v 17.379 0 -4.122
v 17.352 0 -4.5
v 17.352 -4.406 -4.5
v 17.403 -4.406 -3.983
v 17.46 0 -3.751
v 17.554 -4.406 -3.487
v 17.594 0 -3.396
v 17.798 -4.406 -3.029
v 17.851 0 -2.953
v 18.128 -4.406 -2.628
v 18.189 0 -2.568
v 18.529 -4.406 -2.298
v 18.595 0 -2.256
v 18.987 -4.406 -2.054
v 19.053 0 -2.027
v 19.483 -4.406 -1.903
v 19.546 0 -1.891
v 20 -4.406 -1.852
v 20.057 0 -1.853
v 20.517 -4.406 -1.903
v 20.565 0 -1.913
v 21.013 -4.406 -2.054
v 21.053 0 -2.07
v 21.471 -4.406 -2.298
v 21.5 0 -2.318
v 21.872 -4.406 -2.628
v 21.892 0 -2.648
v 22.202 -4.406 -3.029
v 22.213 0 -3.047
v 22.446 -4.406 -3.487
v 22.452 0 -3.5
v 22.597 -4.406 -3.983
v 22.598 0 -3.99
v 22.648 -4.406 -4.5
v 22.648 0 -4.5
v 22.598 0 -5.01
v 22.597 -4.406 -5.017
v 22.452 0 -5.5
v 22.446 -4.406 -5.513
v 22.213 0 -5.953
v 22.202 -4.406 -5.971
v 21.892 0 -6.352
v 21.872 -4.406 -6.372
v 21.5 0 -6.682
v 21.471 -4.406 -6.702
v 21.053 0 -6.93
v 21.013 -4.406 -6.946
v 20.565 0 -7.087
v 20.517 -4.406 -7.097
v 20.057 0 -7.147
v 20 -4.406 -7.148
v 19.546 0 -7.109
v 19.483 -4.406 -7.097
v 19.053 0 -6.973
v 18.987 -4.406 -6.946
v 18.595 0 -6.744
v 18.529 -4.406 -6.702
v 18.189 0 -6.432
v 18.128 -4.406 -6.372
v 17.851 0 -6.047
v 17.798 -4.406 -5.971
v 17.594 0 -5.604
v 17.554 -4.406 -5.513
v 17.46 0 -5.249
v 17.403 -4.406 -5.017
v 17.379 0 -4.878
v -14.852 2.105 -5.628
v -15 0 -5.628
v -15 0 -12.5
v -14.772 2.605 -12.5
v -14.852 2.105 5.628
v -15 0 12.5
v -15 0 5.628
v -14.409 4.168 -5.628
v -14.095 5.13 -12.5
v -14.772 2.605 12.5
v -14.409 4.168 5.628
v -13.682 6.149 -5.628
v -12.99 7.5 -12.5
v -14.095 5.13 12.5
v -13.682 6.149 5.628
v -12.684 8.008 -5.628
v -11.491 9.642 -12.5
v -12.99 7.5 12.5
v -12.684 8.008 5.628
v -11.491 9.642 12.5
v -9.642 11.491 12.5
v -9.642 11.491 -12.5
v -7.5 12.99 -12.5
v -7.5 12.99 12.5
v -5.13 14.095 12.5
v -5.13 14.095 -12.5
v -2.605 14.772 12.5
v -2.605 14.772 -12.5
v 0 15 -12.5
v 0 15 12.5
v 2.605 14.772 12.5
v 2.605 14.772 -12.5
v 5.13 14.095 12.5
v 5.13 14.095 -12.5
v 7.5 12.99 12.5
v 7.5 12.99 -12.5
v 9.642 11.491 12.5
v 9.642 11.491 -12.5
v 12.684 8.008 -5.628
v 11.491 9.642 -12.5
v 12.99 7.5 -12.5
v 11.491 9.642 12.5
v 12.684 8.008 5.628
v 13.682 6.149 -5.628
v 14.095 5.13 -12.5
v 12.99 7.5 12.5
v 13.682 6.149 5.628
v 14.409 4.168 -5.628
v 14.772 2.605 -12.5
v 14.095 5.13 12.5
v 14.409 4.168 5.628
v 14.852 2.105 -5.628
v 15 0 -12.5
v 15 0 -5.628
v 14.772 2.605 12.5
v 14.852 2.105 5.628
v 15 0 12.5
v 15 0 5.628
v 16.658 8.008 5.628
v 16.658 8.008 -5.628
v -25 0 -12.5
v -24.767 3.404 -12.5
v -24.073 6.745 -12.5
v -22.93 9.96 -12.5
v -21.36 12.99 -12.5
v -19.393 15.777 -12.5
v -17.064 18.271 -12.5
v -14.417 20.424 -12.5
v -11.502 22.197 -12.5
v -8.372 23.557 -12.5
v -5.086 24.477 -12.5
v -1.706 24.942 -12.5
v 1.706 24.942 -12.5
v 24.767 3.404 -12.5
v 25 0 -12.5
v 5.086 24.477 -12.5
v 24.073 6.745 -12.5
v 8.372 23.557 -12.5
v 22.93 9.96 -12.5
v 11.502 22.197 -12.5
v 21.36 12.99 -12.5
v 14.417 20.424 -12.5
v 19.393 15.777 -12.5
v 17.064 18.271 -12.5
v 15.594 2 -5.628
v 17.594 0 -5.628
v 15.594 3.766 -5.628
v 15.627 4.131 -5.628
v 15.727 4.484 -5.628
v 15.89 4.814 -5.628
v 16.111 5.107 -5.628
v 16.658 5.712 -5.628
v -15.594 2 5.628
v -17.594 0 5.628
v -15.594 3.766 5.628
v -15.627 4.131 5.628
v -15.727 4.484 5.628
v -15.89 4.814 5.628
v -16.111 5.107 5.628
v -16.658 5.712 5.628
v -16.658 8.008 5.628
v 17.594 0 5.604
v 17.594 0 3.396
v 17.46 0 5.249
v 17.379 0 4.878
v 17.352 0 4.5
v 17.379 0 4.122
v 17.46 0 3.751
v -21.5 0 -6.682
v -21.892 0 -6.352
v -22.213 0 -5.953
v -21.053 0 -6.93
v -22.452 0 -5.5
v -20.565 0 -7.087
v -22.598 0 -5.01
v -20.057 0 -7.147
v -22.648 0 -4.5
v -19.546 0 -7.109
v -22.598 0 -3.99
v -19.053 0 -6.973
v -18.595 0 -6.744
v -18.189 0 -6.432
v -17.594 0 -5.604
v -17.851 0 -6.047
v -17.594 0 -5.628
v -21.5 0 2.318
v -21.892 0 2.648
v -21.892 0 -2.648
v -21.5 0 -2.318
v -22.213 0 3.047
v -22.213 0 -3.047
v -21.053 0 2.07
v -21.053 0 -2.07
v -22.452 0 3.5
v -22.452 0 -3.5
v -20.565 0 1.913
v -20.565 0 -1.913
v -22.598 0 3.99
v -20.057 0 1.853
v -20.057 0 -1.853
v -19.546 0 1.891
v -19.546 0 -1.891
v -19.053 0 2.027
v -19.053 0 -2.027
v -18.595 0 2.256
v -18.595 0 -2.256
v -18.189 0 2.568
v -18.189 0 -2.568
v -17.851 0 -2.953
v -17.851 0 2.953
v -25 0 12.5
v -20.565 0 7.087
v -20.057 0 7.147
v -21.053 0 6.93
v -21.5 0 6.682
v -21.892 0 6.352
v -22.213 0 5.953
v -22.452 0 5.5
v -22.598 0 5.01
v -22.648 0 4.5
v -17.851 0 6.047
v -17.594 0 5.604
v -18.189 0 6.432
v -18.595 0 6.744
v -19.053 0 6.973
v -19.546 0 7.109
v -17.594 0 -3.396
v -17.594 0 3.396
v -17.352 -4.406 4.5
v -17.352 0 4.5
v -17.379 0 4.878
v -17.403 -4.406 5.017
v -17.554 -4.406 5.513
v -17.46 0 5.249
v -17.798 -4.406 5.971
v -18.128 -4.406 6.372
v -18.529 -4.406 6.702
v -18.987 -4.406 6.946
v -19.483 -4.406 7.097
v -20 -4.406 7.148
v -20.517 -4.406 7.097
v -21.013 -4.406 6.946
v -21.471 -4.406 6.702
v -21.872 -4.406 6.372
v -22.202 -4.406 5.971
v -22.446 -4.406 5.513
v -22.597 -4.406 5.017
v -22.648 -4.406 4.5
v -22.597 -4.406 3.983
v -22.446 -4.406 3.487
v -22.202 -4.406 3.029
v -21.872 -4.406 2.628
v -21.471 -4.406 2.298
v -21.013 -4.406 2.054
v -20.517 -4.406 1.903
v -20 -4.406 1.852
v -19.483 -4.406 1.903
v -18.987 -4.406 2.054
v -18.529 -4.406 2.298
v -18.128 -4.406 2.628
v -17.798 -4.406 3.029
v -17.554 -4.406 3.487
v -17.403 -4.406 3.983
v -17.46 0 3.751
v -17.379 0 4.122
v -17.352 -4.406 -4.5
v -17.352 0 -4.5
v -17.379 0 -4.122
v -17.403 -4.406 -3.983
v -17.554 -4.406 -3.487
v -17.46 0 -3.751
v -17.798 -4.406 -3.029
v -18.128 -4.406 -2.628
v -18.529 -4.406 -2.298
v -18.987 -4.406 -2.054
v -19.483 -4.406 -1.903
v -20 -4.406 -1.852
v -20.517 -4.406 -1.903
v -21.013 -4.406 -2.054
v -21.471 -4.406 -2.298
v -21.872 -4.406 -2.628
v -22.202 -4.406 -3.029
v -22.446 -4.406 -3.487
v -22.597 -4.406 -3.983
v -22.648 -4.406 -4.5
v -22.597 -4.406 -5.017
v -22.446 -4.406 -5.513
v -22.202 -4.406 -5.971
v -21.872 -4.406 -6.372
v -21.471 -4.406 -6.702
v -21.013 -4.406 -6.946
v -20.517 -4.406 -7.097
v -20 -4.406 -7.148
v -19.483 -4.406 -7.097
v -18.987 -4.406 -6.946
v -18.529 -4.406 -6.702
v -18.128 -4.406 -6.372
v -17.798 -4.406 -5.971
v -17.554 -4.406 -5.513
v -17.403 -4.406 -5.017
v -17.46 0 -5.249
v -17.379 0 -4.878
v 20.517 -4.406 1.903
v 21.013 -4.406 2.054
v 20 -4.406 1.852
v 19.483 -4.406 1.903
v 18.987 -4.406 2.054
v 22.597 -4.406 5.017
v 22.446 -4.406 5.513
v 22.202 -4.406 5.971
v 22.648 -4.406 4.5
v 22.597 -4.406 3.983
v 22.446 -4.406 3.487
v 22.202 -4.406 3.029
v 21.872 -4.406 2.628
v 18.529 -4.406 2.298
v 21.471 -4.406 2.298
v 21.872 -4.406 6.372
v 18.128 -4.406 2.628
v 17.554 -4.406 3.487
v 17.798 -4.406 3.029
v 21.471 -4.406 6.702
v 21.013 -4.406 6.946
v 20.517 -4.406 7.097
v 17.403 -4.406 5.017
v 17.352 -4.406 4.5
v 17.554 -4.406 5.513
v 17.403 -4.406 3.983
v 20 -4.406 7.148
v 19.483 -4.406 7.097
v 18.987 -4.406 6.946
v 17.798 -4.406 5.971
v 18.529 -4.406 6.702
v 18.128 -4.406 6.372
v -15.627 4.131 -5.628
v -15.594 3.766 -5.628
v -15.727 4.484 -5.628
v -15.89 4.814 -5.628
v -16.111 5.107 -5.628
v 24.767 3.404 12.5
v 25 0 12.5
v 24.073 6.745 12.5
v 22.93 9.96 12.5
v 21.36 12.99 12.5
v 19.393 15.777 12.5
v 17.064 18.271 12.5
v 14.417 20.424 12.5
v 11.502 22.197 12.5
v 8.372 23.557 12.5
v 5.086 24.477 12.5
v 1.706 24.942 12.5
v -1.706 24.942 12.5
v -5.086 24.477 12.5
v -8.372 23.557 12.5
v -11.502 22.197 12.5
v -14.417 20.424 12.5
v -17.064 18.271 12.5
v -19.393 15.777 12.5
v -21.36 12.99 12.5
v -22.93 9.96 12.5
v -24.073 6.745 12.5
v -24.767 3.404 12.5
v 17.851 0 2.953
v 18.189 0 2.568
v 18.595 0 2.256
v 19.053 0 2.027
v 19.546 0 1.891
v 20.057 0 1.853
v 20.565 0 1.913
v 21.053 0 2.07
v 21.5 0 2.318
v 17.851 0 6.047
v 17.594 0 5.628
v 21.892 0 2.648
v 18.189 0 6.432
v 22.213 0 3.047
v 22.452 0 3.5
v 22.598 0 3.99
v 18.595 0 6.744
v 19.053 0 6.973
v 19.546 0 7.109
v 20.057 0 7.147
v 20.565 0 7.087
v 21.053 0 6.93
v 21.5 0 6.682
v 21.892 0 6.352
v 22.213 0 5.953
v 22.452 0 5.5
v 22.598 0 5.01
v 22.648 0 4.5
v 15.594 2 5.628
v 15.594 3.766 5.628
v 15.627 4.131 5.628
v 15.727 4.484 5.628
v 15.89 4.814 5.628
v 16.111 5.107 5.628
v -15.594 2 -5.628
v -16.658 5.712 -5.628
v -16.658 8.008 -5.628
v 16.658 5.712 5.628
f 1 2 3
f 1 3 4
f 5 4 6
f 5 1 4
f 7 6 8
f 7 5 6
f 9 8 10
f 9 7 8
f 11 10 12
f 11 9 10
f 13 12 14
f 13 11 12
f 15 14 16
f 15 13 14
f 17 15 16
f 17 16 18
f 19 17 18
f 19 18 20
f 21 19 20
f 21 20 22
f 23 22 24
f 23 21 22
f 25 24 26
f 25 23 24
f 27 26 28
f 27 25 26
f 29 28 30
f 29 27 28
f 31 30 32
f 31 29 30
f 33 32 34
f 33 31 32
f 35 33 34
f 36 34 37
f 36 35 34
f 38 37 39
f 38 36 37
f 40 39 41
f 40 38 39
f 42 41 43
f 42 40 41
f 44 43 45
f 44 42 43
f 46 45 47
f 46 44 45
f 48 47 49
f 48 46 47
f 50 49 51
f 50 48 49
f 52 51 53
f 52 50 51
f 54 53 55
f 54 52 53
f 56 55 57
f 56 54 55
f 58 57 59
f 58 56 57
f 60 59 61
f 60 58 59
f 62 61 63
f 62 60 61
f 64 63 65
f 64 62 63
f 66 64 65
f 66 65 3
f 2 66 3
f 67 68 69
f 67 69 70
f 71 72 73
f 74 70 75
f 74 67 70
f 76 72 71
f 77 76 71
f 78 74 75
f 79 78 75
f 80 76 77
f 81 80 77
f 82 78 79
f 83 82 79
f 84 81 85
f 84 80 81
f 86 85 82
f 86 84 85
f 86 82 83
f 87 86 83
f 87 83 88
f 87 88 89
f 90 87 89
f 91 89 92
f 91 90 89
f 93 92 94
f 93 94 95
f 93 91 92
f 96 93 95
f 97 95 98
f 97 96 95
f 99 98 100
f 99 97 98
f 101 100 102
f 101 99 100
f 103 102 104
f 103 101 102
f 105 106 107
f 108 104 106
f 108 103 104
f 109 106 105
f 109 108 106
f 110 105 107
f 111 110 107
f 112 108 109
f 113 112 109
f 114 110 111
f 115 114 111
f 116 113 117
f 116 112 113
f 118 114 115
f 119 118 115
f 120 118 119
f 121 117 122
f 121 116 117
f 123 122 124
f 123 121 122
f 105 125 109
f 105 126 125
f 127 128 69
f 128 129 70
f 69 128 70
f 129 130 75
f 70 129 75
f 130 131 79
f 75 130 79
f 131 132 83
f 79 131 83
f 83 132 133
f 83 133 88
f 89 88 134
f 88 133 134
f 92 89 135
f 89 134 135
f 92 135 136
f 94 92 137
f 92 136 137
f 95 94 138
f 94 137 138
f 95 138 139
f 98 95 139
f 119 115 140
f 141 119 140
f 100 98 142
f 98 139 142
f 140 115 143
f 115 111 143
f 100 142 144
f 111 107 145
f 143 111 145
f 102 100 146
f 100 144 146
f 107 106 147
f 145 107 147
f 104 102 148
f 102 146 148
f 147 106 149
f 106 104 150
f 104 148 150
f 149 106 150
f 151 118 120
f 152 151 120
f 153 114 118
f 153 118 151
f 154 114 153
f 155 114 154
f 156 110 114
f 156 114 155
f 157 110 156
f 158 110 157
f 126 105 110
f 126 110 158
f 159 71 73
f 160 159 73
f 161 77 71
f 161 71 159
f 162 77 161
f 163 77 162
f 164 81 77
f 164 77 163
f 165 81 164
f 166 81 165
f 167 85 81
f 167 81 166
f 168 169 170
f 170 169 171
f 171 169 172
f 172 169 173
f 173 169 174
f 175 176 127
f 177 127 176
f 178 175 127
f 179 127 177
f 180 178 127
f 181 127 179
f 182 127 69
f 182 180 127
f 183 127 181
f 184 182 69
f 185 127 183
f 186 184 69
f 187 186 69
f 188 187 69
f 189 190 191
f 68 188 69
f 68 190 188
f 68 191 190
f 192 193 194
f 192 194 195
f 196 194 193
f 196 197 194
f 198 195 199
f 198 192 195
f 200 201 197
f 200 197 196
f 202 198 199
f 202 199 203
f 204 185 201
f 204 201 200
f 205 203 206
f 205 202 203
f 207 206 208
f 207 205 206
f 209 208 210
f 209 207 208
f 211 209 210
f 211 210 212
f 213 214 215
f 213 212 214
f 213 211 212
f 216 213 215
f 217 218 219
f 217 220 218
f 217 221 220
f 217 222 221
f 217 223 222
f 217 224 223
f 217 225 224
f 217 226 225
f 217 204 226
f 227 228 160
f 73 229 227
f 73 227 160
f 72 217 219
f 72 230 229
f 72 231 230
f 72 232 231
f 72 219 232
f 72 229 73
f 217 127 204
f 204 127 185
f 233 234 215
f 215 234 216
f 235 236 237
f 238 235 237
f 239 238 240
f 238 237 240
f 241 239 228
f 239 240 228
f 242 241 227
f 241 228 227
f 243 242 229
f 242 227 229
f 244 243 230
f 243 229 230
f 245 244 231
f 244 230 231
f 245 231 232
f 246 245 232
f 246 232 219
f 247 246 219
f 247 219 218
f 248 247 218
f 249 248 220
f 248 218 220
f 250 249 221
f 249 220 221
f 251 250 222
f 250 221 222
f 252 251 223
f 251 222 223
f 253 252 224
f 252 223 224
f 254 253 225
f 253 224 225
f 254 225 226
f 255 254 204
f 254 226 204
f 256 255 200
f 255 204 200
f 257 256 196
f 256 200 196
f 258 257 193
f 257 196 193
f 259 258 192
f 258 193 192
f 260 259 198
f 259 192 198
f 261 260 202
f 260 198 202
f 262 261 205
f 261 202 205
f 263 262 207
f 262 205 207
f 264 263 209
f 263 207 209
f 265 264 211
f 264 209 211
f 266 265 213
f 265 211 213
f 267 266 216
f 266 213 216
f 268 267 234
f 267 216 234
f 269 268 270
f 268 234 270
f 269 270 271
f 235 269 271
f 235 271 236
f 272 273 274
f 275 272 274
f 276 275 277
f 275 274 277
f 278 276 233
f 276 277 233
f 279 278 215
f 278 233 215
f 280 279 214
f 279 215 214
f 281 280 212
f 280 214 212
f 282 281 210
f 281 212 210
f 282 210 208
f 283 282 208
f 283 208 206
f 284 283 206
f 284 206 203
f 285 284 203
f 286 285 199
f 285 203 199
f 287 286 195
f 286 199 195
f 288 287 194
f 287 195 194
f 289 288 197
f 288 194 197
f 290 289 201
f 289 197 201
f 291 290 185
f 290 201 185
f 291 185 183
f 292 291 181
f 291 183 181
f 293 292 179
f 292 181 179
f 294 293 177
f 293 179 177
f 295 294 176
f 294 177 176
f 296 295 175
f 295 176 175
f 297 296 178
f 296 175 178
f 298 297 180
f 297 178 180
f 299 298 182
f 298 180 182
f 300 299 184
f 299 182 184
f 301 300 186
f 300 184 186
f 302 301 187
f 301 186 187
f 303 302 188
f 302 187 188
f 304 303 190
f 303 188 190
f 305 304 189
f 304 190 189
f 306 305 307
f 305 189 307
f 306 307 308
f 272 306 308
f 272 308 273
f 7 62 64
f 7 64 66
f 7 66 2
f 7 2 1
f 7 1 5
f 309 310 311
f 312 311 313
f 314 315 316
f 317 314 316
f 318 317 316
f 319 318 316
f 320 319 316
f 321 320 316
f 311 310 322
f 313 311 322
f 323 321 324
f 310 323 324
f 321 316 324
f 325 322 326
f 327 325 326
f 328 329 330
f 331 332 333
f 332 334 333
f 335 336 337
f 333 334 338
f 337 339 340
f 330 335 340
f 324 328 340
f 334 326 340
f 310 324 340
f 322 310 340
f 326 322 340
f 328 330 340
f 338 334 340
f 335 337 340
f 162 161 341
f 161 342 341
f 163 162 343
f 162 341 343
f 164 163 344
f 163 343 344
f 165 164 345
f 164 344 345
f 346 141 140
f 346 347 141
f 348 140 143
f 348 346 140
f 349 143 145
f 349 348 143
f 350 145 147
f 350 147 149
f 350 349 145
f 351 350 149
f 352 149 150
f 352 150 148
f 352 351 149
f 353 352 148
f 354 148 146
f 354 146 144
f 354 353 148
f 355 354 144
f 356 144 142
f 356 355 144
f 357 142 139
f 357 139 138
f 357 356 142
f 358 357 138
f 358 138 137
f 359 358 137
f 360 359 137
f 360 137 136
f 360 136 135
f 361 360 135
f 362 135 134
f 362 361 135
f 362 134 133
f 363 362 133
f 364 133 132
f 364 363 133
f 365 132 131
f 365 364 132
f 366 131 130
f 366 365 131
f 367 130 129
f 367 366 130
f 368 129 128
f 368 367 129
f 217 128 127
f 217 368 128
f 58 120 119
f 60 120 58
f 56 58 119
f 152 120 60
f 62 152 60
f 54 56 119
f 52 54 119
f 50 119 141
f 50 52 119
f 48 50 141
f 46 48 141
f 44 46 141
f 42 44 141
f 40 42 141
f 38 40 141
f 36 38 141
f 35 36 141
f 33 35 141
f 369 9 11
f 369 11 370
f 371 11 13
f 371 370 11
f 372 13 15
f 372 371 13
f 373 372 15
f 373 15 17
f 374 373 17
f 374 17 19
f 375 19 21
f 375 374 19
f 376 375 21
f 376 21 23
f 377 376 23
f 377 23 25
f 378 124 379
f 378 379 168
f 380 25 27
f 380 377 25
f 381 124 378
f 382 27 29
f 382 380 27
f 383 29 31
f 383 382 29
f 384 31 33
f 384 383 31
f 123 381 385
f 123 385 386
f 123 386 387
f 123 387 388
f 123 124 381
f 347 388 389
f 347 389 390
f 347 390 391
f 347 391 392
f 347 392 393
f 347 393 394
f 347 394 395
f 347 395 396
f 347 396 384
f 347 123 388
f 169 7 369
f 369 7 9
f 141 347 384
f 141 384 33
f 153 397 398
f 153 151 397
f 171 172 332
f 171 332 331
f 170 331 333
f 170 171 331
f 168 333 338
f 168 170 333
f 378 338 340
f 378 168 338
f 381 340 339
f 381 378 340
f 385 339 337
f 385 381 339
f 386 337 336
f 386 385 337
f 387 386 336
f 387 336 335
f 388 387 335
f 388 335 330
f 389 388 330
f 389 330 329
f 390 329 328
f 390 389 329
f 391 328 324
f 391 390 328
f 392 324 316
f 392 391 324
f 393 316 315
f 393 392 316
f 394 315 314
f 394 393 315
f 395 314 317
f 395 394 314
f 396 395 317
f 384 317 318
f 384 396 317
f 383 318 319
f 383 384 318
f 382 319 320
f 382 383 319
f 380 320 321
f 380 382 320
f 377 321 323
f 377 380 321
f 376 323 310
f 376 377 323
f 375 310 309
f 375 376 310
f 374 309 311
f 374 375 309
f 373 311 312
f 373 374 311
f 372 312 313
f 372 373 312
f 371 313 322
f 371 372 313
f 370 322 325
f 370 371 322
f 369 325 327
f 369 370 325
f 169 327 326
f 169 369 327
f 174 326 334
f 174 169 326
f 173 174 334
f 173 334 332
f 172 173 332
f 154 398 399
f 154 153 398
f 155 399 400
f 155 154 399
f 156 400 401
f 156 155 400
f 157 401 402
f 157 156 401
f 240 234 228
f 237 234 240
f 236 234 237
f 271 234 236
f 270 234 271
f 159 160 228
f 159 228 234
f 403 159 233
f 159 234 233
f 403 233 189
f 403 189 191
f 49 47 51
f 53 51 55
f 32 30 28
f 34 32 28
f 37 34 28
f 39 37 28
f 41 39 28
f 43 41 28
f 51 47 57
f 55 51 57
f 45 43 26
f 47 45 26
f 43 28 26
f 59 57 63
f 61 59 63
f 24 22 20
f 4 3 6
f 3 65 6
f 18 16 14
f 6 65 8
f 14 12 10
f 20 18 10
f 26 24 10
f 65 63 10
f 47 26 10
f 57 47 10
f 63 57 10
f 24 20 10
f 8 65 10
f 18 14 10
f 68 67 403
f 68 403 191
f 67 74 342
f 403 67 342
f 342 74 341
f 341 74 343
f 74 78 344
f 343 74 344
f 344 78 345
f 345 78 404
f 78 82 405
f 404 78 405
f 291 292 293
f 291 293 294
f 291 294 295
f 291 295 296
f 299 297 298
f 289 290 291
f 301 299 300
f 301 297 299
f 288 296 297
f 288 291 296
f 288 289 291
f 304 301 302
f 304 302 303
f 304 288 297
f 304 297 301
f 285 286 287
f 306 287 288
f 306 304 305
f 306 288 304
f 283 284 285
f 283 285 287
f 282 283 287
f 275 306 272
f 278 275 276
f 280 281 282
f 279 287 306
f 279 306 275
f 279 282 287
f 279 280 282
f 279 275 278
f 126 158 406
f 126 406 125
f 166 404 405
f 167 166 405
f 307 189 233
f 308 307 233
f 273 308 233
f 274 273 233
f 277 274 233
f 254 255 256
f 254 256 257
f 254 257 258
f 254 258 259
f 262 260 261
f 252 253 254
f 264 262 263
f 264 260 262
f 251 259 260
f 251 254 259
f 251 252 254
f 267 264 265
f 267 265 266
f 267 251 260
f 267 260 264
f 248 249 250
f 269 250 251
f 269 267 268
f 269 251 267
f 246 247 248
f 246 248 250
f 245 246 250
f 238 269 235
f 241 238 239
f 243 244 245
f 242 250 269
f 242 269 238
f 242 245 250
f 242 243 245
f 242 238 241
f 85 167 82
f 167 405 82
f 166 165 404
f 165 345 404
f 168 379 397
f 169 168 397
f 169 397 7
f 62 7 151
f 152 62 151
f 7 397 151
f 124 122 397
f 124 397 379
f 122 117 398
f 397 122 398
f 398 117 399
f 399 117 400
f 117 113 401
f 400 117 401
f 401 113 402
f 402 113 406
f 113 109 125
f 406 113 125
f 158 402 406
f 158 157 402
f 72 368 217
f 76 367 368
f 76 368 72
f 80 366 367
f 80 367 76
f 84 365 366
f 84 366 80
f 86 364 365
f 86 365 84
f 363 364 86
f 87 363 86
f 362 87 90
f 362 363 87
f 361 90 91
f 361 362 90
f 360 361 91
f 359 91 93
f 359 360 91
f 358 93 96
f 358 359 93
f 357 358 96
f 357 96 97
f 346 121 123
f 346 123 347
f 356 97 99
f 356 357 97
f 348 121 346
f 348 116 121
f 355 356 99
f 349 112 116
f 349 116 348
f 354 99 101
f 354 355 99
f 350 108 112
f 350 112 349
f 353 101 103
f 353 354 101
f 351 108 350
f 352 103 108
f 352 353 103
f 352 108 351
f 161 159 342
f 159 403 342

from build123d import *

# Parameters (mm, degrees)
BOSS_EXTRUDE1_DEPTH = 12.5
CUT_EXTRUDE1_DEPTH  = 5.628
FILLET5_R           = 2
CHAMFER9_SIZE       = 2
SKETCH4_R           = 2.64775
BOSS_EXTRUDE2_DEPTH = 4.4055


with BuildPart() as part:
    # Sketch1 → Boss-Extrude1 (new body, symmetric)
    with BuildSketch(Plane.XY):
        with BuildLine():
            Line((-25, 0), (-15, 0))
            ThreePointArc((-15, 0), (0, 15), (15, 0))
            Line((15, 0), (25, 0))
            ThreePointArc((25, 0), (0, 25), (-25, 0))
        make_face()
    extrude(amount=BOSS_EXTRUDE1_DEPTH, both=True)

    # Sketch3 → Cut-Extrude1 (cut, symmetric)
    with BuildSketch(Plane(origin=(0, 0, 0), x_dir=(-1, 0, 0), z_dir=(0, 0, -1))):
        with BuildLine():
            Line((15, 0), (15.5936, 0))
            Line((15.5936, 0), (15.5936, 4.536))
            Line((15.5936, 4.536), (16.6576, 5.712))
            Line((16.6576, 5.712), (16.6576, 8.008))
            Line((16.6576, 8.008), (12.683530108, 8.008))
            ThreePointArc((12.683530108, 8.008), (14.409249662, 4.16815597), (15, 0))
        make_face()
    cut_extrude1 = extrude(amount=CUT_EXTRUDE1_DEPTH, both=True, mode=Mode.SUBTRACT)

    # Mirror3: Cut-Extrude1 across plane
    add(cut_extrude1.mirror(Plane(origin=(0, 0, 0), x_dir=(0, 0, 1), z_dir=(1, 0, 0))), mode=Mode.SUBTRACT)

    # Fillet5
    fillet5_edges = [part.edges().sort_by_distance(p)[0] for p in [
        (-15.5936, 4.536, 0),
        (15.5936, 4.536, 0),
    ]]
    fillet(fillet5_edges, radius=FILLET5_R)

    # Chamfer9
    chamfer9_edges = [part.edges().sort_by_distance(p)[0] for p in [
        (-15.5936, 0, 0),
        (15.5936, 0, 0),
    ]]
    chamfer(chamfer9_edges, length=CHAMFER9_SIZE)

    # Sketch4 → Boss-Extrude2 (add)
    with BuildSketch(Plane.XZ):
        with Locations((-20, 4.5)):
            Circle(SKETCH4_R)
        with Locations((-20, -4.5)):
            Circle(SKETCH4_R)
    boss_extrude2 = extrude(amount=BOSS_EXTRUDE2_DEPTH)

    # Mirror4: Boss-Extrude2 across plane
    add(boss_extrude2.mirror(Plane(origin=(0, 0, 0), x_dir=(0, 0, 1), z_dir=(1, 0, 0))))


solid = part.part
